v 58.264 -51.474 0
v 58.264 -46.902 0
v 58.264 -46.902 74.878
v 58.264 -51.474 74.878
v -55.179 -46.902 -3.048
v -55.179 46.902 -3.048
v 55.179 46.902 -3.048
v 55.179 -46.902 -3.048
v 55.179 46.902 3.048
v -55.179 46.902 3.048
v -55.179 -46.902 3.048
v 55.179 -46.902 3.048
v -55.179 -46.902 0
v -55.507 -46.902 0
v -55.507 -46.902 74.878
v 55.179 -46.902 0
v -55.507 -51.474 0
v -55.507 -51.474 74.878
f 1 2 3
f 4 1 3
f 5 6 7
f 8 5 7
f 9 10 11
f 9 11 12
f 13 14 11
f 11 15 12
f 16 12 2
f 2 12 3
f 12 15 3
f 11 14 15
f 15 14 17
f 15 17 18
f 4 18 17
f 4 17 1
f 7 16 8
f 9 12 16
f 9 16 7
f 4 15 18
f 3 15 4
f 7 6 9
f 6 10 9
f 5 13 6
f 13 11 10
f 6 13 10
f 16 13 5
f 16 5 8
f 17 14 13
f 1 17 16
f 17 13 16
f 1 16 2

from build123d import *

# Parameters (mm, degrees)
F0_W     = 110.358618
F0_H     = 93.804828
F3_DEPTH = 3.048
F2_W     = 113.771484
F2_H     = 74.878134
F4_DEPTH = 4.572


with BuildPart() as f3:
    # F0 (on Top) → F3 (new body, symmetric)
    with BuildSketch(Plane.XY):
        Rectangle(F0_W, F0_H)
    extrude(amount=F3_DEPTH, both=True)

    # F2 (on face) → F4 (join)
    with BuildSketch(Plane.XZ.offset(46.902414)):
        with Locations((1.378391, 37.439067)):
            Rectangle(F2_W, F2_H)
    extrude(amount=F4_DEPTH)


solid = f3.part
